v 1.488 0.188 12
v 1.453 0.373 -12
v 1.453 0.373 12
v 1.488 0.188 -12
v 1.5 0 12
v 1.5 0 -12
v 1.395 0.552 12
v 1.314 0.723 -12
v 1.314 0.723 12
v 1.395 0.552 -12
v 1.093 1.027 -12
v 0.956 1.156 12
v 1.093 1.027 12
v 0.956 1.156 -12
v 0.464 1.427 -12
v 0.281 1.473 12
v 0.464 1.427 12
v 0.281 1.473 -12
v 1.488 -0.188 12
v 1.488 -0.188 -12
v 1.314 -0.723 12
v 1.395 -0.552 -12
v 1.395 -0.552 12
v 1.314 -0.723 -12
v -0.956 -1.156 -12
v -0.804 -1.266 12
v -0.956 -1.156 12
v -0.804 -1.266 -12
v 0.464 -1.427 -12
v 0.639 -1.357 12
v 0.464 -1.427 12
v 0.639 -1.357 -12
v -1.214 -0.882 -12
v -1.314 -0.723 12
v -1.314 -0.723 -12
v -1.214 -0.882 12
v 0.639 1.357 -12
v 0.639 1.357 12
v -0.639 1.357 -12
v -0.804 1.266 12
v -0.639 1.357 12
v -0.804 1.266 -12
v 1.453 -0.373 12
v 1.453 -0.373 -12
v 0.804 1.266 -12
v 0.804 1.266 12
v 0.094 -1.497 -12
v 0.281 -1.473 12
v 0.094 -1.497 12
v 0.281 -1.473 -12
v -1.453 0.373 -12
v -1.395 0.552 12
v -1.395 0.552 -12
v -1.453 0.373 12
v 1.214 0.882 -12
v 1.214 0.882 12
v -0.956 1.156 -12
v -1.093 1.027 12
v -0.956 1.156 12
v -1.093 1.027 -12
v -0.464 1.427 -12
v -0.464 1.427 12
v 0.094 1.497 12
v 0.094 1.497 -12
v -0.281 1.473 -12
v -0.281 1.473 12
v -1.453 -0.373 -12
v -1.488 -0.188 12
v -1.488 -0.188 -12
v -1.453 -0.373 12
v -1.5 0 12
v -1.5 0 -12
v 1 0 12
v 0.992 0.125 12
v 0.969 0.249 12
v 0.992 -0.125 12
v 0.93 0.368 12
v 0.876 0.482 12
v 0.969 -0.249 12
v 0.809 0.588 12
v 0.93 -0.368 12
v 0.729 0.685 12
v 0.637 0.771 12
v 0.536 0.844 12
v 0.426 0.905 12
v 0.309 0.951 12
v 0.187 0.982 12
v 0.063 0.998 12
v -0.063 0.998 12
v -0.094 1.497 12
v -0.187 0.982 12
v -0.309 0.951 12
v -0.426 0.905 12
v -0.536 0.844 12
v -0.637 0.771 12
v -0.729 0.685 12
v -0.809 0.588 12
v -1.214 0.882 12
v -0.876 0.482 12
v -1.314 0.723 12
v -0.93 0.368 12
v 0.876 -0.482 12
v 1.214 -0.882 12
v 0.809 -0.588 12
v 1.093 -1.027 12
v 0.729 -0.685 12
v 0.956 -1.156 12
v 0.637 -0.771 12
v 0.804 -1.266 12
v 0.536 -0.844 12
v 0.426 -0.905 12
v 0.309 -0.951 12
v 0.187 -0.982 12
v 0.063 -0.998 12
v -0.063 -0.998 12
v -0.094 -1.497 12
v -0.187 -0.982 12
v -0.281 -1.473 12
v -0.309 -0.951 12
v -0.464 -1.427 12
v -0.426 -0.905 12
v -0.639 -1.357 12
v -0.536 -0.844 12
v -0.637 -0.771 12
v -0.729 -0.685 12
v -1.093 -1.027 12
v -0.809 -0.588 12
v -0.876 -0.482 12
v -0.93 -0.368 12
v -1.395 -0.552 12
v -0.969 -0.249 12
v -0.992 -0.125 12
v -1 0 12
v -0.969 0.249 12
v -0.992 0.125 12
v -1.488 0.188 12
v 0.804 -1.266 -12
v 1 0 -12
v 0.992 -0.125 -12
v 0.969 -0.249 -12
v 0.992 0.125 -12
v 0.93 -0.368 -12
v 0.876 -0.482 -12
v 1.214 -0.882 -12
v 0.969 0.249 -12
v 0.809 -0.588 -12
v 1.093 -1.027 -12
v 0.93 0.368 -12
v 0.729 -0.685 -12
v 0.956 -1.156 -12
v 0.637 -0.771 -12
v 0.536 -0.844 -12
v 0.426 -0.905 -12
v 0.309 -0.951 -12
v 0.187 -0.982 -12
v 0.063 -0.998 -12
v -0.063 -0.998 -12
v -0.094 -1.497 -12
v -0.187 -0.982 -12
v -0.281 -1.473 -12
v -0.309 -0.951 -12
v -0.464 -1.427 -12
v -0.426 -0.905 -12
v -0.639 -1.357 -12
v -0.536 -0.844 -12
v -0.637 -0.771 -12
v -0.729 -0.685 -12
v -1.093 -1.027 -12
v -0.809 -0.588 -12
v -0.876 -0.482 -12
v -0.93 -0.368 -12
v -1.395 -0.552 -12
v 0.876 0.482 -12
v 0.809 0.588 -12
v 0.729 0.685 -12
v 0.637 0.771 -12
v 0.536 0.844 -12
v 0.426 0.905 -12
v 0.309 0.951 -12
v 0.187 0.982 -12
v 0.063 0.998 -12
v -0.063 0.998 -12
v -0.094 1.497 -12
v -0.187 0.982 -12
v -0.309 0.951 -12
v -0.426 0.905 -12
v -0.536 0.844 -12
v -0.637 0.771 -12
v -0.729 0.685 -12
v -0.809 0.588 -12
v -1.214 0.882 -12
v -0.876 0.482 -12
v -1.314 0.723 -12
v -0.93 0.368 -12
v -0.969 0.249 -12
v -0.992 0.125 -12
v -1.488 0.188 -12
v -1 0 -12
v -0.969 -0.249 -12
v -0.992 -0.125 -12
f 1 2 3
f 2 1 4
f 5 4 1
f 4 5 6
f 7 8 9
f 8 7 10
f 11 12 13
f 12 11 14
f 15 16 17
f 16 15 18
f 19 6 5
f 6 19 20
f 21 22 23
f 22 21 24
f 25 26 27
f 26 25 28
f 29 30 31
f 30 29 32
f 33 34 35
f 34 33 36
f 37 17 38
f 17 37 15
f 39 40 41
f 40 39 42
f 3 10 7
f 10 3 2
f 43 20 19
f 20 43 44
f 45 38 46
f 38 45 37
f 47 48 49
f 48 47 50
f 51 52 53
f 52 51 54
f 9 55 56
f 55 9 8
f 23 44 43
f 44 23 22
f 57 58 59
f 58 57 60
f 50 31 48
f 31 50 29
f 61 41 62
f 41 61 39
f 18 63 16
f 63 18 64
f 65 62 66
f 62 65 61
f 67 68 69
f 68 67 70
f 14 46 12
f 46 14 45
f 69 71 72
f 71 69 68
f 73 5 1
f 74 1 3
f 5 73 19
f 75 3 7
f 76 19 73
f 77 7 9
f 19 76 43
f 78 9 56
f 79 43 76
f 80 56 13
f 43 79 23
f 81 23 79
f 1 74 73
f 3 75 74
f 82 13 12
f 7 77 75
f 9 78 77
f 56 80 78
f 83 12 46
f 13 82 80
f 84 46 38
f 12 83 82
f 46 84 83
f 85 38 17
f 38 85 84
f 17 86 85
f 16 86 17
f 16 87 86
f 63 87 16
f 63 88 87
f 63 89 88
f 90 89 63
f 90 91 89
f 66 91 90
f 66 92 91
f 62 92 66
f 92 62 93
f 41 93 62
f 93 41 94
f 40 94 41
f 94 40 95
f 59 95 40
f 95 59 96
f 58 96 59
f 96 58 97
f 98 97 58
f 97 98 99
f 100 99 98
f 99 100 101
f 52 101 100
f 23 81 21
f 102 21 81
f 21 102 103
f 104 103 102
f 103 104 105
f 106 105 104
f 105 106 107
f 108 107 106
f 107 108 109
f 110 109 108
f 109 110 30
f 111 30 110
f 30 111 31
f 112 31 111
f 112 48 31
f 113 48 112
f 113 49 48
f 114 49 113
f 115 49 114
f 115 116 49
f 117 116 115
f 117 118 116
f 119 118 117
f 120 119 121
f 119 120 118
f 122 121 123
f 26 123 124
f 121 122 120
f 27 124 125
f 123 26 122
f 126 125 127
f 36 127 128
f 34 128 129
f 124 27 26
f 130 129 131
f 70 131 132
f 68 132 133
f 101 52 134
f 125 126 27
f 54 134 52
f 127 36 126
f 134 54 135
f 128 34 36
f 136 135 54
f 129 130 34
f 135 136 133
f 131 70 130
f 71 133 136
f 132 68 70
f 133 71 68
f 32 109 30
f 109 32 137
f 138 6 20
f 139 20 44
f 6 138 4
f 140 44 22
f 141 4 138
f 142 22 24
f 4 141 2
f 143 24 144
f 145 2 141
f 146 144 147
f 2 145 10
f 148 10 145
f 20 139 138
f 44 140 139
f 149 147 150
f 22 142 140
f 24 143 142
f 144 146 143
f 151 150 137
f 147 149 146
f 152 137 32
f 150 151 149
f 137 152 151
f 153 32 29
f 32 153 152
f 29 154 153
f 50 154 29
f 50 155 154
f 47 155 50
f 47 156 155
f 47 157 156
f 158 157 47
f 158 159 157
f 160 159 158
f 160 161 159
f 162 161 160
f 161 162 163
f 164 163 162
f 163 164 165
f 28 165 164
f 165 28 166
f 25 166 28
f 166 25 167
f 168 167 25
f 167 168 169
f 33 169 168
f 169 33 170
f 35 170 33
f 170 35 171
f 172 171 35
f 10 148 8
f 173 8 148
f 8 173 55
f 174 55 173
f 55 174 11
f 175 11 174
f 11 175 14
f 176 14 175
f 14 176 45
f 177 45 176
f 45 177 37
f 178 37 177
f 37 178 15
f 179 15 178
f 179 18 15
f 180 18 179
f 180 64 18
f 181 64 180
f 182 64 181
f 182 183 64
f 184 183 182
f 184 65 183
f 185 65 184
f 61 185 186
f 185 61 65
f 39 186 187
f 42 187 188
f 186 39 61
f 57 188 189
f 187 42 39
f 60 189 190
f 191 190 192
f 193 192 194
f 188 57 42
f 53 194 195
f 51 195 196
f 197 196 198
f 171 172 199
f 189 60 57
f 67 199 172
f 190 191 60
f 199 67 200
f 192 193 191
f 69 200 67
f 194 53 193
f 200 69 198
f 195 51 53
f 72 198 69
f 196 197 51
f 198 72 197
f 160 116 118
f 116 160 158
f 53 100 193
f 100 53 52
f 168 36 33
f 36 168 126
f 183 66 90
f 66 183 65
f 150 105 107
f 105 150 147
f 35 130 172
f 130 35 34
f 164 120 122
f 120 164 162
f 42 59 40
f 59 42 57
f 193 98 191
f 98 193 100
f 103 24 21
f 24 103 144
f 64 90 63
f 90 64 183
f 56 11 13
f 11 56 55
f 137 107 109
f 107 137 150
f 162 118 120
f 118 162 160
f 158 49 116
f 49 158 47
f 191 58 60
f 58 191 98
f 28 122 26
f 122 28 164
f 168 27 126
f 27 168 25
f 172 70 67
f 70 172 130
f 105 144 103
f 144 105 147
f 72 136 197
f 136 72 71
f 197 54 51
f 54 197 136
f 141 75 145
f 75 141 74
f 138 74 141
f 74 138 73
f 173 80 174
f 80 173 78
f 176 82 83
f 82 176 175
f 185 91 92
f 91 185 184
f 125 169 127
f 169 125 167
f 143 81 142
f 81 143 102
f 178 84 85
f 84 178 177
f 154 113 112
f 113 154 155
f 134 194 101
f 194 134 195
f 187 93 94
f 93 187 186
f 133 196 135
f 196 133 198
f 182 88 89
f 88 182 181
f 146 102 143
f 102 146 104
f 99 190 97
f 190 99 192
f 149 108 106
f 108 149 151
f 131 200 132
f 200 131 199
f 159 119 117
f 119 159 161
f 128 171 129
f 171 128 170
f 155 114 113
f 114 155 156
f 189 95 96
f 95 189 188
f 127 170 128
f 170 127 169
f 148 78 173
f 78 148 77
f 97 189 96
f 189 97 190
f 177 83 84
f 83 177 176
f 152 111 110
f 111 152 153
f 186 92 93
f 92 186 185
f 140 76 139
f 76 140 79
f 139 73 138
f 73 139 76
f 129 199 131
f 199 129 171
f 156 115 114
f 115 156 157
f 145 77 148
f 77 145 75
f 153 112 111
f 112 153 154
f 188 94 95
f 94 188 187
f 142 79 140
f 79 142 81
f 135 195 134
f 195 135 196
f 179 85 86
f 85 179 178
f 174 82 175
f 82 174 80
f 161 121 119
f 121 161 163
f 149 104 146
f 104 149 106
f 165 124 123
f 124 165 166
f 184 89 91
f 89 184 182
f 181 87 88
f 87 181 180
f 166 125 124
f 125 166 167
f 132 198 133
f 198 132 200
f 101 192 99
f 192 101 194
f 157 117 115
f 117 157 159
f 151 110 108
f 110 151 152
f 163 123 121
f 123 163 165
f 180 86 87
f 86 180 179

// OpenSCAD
$fn = 50;


difference() {
	union() {
		translate(v = [0, 0, -12.0000000000]) {
			cylinder(h = 24, r = 1.5000000000);
		}
	}
	union() {
		translate(v = [0, 0, -100.0000000000]) {
			cylinder(h = 200, r = 1.0000000000);
		}
	}
}
